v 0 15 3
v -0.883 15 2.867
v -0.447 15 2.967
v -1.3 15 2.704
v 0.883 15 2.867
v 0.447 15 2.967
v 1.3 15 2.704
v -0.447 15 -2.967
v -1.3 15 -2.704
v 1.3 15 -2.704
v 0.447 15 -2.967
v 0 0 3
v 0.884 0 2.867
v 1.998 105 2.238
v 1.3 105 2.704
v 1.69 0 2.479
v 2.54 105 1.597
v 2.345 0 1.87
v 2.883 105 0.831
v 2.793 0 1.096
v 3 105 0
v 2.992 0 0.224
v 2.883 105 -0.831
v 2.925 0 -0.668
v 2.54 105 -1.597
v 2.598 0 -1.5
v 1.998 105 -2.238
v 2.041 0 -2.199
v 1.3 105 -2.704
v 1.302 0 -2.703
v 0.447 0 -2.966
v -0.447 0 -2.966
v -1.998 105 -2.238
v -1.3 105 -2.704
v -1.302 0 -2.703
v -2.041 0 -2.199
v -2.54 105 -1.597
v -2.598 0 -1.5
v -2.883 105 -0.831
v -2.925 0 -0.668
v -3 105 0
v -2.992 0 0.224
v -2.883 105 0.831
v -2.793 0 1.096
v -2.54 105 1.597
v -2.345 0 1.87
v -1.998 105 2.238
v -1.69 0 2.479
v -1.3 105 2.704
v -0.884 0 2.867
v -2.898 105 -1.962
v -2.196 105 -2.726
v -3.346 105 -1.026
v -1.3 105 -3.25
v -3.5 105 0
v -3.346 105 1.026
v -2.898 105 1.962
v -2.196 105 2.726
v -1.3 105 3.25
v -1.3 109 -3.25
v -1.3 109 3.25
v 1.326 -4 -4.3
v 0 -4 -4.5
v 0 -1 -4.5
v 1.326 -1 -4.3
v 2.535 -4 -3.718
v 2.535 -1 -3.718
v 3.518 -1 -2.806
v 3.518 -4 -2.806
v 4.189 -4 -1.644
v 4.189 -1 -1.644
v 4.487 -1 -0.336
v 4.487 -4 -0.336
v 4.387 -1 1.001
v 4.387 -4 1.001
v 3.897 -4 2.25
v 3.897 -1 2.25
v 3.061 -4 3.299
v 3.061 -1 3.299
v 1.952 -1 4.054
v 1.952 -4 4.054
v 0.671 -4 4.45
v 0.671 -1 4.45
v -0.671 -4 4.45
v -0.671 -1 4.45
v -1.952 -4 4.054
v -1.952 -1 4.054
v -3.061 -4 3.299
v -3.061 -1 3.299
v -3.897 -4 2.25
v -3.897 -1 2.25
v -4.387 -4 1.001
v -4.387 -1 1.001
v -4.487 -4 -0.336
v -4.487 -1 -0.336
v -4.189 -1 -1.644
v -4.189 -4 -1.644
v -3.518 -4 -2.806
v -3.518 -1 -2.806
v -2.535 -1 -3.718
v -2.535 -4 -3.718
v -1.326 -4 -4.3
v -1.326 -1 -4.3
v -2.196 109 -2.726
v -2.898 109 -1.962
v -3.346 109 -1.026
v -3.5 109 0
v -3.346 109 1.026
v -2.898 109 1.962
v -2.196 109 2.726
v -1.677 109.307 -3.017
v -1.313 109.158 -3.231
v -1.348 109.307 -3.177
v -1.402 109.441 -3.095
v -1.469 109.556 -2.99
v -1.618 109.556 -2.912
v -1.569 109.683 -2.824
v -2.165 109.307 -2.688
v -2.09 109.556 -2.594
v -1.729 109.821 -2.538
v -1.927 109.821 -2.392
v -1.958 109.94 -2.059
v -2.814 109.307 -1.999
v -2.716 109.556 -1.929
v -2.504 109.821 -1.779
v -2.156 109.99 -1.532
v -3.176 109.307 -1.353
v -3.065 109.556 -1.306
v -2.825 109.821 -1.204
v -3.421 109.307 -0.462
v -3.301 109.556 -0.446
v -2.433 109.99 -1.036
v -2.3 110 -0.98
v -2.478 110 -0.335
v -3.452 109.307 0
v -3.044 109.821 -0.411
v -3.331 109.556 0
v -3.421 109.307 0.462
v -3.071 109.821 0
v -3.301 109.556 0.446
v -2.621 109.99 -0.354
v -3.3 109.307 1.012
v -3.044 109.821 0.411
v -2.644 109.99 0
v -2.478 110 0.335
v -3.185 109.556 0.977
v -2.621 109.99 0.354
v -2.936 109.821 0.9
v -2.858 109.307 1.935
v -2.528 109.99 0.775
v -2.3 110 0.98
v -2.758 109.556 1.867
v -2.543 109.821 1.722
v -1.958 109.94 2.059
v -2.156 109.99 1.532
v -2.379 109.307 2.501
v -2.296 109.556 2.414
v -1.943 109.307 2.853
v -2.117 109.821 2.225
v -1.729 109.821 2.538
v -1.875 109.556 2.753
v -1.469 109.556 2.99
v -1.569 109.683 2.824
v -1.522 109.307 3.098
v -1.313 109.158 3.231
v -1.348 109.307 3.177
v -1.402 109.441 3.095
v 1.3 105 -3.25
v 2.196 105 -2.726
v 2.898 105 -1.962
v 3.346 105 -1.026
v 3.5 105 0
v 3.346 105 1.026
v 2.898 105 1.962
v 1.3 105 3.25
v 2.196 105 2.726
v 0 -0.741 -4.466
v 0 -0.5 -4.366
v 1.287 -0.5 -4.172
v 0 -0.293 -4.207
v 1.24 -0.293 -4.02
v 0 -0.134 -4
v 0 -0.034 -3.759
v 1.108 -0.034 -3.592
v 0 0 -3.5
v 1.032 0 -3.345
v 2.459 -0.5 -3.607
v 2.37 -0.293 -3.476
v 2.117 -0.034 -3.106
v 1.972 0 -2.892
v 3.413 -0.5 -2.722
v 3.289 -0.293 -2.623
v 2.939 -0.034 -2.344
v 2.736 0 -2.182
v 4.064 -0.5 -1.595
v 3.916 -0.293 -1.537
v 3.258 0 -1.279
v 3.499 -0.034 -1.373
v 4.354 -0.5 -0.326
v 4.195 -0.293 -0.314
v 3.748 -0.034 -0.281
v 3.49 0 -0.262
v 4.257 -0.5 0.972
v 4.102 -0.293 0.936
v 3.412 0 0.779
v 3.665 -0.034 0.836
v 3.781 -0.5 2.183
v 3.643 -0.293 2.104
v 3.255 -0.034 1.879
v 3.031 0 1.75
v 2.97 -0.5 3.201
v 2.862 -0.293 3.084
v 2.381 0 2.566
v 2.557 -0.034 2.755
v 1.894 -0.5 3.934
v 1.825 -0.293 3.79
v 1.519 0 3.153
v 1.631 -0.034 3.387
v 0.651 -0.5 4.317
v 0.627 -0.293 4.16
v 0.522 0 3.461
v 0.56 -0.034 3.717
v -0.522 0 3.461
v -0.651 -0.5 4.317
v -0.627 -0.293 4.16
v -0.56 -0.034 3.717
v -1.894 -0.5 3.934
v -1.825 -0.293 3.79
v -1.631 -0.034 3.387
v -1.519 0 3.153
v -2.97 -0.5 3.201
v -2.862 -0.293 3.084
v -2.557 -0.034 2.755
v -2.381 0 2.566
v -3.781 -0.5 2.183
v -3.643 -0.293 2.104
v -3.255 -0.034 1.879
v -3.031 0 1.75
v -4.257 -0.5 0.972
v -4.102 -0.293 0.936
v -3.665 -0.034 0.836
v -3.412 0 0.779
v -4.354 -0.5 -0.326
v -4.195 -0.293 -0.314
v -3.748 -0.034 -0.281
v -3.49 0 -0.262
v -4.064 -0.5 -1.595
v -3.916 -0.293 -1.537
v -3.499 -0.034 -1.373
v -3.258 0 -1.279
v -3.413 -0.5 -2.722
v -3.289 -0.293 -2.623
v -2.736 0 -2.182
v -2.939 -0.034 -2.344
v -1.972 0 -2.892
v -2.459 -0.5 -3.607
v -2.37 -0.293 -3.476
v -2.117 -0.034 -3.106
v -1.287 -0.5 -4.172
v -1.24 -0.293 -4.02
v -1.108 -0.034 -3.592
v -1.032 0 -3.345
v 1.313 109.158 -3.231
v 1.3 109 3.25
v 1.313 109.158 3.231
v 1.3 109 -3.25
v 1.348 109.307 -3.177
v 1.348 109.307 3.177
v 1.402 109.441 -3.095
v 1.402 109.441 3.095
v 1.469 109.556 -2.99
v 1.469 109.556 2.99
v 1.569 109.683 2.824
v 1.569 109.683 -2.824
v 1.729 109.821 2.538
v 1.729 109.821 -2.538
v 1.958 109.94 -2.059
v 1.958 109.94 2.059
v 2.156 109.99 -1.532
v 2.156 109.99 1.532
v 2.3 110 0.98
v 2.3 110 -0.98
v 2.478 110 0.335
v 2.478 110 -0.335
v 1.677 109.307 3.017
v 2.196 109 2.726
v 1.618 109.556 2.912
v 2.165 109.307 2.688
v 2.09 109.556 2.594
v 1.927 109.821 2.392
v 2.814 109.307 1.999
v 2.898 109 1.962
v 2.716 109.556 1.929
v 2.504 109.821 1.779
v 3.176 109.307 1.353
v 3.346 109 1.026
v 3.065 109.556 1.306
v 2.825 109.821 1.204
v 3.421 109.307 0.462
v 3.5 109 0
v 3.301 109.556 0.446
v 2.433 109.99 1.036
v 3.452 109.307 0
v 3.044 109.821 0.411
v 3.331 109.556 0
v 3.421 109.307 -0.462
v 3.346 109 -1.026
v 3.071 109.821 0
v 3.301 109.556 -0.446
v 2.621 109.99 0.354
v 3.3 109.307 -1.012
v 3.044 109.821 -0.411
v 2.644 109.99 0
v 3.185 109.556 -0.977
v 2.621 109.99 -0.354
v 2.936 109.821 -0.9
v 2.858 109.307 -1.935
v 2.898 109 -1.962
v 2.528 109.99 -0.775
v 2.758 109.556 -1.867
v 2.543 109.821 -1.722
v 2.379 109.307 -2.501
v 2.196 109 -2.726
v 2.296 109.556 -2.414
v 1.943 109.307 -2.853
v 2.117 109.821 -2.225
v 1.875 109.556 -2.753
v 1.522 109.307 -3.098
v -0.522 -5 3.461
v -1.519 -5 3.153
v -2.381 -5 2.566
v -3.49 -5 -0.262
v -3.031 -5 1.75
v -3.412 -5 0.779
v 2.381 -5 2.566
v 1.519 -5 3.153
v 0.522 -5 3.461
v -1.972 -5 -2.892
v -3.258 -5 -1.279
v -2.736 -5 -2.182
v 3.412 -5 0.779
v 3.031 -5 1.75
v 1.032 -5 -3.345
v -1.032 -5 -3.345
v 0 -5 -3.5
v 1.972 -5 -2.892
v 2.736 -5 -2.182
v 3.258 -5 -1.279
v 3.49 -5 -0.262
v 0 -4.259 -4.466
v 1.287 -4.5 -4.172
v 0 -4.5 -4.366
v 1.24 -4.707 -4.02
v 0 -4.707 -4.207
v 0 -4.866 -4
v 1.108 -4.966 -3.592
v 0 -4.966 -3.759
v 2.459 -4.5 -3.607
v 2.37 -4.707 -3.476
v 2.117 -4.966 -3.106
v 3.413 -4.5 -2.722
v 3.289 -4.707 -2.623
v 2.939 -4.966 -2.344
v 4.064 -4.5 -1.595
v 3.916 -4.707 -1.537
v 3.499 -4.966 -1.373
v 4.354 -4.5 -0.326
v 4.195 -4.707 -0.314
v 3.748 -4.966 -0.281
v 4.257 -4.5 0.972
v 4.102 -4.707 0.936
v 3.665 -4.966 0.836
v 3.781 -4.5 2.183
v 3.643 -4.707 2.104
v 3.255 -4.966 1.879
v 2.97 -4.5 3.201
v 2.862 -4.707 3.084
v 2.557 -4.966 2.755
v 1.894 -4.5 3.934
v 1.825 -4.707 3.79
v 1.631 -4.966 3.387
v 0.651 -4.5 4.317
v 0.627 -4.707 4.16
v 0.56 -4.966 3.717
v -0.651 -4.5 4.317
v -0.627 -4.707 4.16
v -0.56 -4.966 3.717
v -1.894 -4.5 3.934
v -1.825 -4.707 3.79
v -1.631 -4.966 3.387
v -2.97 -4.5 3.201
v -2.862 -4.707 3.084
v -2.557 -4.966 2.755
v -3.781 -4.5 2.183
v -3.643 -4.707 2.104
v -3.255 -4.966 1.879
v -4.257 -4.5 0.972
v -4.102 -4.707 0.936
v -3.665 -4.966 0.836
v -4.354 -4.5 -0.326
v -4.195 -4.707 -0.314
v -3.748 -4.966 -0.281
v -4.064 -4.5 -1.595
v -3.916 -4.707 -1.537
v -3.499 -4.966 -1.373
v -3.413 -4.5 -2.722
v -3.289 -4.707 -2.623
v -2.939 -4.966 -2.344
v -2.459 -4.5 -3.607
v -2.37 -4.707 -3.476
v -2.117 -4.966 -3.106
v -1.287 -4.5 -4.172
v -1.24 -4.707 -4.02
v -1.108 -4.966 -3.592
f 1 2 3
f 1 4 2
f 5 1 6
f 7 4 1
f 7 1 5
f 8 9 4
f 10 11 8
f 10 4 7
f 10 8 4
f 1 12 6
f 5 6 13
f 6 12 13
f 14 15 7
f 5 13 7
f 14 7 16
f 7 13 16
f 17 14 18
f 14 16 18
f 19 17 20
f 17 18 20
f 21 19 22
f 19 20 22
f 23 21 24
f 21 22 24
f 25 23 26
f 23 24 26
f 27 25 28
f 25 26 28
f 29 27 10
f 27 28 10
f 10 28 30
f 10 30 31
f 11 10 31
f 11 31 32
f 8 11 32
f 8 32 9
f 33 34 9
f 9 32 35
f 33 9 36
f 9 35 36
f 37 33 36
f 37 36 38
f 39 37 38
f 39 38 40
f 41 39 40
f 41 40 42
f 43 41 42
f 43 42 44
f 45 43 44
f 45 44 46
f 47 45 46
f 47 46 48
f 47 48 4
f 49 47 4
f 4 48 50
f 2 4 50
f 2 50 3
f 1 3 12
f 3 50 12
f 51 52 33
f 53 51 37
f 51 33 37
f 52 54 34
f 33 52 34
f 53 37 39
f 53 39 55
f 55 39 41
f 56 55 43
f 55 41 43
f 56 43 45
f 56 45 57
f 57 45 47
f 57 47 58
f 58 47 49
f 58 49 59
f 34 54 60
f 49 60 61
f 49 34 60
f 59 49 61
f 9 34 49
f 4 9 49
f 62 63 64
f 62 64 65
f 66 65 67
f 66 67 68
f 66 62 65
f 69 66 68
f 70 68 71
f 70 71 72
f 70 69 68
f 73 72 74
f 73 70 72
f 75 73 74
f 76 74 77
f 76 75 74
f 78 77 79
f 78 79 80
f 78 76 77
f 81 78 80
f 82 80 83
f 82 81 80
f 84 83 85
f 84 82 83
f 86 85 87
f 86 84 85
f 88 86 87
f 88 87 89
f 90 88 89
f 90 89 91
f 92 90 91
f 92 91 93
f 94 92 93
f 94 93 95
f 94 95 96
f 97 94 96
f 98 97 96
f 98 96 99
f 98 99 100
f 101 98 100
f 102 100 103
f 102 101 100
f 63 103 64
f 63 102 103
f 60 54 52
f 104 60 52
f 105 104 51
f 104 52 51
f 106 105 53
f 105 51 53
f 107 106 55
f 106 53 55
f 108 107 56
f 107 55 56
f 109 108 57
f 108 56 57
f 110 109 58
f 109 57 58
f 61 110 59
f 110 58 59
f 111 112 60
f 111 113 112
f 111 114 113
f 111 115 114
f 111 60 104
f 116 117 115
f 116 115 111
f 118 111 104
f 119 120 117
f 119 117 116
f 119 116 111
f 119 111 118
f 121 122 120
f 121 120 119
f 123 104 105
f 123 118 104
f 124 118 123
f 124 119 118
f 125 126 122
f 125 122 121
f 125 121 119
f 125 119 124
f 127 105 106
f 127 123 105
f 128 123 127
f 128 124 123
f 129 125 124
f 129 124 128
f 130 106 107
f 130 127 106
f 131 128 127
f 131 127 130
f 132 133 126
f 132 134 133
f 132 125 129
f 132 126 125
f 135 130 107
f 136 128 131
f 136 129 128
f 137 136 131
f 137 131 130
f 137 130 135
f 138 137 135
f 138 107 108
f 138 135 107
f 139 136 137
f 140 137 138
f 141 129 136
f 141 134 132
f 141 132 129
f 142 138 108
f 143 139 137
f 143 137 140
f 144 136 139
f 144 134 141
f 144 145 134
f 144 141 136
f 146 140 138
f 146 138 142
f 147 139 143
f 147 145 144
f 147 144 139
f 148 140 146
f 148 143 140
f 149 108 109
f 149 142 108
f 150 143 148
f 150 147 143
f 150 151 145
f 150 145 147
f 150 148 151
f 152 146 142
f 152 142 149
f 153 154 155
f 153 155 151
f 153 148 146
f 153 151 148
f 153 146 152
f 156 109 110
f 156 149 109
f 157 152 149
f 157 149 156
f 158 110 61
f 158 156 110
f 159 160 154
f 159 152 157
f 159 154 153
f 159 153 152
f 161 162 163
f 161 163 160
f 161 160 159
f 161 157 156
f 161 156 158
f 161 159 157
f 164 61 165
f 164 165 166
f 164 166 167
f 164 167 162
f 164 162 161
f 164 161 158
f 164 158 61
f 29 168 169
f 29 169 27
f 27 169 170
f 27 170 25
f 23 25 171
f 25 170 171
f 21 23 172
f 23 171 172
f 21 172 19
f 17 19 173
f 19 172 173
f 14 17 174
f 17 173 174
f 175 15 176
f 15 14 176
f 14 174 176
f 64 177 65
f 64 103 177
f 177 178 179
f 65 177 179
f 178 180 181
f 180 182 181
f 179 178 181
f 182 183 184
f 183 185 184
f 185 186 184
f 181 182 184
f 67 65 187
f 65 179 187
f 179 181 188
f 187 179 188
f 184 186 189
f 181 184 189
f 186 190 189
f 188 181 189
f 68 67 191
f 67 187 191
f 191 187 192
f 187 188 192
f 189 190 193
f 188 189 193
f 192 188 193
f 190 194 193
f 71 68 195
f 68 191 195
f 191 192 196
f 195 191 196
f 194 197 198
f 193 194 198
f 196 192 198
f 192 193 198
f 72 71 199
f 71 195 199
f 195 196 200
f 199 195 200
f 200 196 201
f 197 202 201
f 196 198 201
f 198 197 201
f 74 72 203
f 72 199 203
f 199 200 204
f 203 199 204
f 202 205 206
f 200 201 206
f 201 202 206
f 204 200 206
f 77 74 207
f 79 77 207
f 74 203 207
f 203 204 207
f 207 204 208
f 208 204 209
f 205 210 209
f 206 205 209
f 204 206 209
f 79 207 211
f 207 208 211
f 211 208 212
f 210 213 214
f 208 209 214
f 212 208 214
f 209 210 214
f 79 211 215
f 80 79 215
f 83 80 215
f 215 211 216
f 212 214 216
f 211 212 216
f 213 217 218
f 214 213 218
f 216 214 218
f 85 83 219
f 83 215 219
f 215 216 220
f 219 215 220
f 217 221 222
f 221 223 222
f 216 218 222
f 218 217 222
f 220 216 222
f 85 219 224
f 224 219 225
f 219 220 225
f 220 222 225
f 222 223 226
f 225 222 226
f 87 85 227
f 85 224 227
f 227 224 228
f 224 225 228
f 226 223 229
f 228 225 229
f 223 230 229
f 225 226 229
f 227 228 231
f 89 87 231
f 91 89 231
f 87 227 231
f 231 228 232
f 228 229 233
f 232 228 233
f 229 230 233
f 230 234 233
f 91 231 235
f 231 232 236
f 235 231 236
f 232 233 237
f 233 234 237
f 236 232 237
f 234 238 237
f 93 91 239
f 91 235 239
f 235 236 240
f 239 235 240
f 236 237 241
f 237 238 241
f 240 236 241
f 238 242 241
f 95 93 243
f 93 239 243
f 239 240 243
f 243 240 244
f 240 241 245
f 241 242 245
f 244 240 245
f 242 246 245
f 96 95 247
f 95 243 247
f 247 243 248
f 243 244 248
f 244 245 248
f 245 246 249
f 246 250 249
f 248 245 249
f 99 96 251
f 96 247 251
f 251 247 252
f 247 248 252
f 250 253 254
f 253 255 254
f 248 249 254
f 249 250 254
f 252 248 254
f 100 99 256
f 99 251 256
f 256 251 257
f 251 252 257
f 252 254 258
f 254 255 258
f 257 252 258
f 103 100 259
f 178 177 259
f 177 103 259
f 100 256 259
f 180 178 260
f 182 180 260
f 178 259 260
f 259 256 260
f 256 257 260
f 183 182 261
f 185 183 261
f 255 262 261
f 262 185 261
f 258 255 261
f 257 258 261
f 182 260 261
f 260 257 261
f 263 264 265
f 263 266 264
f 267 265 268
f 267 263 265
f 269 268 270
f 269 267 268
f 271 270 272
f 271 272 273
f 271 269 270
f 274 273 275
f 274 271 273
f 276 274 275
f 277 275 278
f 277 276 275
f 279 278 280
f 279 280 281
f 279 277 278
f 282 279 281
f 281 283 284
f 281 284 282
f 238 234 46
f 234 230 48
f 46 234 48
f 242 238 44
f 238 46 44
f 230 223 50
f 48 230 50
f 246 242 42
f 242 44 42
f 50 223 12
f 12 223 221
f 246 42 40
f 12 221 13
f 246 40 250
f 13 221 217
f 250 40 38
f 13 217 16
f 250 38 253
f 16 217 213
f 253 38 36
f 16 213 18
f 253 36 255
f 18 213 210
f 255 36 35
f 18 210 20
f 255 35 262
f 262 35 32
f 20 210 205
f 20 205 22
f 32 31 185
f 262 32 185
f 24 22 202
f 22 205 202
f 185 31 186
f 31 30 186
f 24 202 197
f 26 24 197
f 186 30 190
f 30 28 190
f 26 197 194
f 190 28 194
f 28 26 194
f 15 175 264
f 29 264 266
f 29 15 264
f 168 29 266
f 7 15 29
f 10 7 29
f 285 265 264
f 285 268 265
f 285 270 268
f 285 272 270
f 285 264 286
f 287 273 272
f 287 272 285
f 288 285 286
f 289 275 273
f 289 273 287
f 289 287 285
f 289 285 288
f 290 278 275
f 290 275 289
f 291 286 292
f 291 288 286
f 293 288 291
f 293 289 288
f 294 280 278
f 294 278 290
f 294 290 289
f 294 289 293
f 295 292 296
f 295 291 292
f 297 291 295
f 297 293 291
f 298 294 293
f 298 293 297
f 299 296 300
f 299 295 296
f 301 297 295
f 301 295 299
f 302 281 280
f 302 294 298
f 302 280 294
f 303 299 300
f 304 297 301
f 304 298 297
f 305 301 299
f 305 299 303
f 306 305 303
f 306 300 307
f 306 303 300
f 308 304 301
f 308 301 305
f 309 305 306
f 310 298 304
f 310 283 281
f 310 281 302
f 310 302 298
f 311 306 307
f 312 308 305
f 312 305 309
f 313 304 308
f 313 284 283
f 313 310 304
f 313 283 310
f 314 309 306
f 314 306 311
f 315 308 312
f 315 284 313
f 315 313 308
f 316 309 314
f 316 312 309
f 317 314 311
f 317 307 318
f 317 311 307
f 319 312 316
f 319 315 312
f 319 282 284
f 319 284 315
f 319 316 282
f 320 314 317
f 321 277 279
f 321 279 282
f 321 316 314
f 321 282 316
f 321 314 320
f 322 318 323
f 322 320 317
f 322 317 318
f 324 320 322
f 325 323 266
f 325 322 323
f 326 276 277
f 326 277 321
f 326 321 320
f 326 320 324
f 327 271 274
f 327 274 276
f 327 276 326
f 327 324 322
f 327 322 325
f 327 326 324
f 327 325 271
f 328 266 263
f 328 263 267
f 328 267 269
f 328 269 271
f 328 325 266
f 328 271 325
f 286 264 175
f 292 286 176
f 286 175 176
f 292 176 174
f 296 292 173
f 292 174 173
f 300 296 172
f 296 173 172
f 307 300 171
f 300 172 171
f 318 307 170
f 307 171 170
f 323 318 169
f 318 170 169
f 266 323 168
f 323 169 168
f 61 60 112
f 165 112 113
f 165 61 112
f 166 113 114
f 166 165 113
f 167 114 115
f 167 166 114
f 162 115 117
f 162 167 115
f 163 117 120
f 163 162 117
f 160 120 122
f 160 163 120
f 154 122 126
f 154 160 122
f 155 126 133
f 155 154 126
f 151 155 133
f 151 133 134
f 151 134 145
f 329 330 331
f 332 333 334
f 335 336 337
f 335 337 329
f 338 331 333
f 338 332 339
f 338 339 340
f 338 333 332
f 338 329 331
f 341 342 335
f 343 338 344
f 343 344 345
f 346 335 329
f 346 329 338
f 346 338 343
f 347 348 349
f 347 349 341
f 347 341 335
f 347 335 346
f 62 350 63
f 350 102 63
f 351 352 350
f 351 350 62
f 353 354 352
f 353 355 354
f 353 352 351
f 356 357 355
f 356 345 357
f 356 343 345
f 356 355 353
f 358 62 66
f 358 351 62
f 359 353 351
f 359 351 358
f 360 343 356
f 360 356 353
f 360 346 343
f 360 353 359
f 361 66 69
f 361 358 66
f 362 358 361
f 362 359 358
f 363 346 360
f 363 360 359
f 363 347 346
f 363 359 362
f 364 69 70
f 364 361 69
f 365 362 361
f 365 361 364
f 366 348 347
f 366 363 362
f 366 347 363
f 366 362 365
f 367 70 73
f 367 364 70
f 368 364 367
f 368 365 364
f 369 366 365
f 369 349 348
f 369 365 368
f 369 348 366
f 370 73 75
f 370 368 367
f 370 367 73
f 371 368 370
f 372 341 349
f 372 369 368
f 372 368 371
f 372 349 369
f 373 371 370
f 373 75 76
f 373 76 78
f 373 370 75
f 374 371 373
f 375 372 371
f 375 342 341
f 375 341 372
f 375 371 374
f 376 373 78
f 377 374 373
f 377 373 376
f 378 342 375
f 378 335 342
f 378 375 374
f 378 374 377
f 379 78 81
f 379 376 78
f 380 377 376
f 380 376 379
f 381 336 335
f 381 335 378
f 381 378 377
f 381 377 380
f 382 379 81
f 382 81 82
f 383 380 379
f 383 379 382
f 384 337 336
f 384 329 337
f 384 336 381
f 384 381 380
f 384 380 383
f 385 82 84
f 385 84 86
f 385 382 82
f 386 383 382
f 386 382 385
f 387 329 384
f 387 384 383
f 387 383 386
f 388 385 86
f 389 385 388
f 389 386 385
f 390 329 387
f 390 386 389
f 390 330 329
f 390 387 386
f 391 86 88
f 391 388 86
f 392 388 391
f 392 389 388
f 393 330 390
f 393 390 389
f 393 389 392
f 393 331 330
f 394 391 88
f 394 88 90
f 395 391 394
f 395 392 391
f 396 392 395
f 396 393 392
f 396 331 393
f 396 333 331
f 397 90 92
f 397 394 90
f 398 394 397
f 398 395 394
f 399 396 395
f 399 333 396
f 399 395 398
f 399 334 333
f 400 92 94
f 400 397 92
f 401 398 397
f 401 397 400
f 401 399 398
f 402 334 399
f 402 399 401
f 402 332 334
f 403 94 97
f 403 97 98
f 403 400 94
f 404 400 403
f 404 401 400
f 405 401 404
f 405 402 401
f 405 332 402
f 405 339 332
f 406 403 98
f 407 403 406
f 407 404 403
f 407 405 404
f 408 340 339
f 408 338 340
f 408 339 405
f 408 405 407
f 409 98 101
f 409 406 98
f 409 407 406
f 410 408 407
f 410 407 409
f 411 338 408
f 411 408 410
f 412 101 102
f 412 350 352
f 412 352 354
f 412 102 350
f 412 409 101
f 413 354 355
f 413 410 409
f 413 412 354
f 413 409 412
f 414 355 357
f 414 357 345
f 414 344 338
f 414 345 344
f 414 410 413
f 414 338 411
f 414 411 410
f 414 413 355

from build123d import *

# Parameters (mm, degrees)
SKETCH1_R           = 3
BOSS_EXTRUDE1_DEPTH = 110
SKETCH2_R           = 4.5
BOSS_EXTRUDE2_DEPTH = 5
FILLET1_R           = 1
BOSS_EXTRUDE3_START = -5
SKETCH3_R           = 3.5
SKETCH3_R_2         = 3
BOSS_EXTRUDE3_DEPTH = 5
CUT_EXTRUDE1_START  = -95
CUT_EXTRUDE1_DEPTH  = 95
FILLET2_R           = 1


with BuildPart() as part:
    # Sketch1 → Boss-Extrude1 (new body)
    with BuildSketch(Plane(origin=(0, 0, 0), x_dir=(1, 0, 0), z_dir=(0, 1, 0))):
        Circle(SKETCH1_R)
    extrude(amount=BOSS_EXTRUDE1_DEPTH)

    # Sketch2 → Boss-Extrude2 (add)
    with BuildSketch(Plane.XZ):
        Circle(SKETCH2_R)
    extrude(amount=BOSS_EXTRUDE2_DEPTH)

    # Fillet1
    fillet1_edges = [part.edges().sort_by_distance(p)[0] for p in [
        (-4.5, 0, 0),
        (-4.5, -5, 0),
    ]]
    fillet(fillet1_edges, radius=FILLET1_R)

    # Sketch3 → Boss-Extrude3 (add)
    with BuildSketch(Plane(origin=(0, 110, 0), x_dir=(1, 0, 0), z_dir=(0, 1, 0)).offset(BOSS_EXTRUDE3_START)):
        Circle(SKETCH3_R)
        Circle(SKETCH3_R_2, mode=Mode.SUBTRACT)
    extrude(amount=BOSS_EXTRUDE3_DEPTH)

    # Sketch4 → Cut-Extrude1 (cut)
    with BuildSketch(Plane(origin=(0, 110, 0), x_dir=(1, 0, 0), z_dir=(0, 1, 0)).offset(CUT_EXTRUDE1_START)):
        with BuildLine():
            Line((-1.3, 3.249615362), (-1.3, -3.249615362))
            ThreePointArc((-1.3, -3.249615362), (0, -3.5), (1.3, -3.249615362))
            Line((1.3, -3.249615362), (1.3, 3.249615362))
            ThreePointArc((1.3, 3.249615362), (0, 3.5), (-1.3, 3.249615362))
        make_face()
    extrude(amount=CUT_EXTRUDE1_DEPTH, mode=Mode.SUBTRACT)

    # Fillet2
    fillet2_edges = [part.edges().sort_by_distance(p)[0] for p in [
        (1.3, 110, 0),
        (-1.3, 110, 0),
        (3.5, 110, 0),
        (-3.5, 110, 0),
    ]]
    fillet(fillet2_edges, radius=FILLET2_R)


solid = part.part
